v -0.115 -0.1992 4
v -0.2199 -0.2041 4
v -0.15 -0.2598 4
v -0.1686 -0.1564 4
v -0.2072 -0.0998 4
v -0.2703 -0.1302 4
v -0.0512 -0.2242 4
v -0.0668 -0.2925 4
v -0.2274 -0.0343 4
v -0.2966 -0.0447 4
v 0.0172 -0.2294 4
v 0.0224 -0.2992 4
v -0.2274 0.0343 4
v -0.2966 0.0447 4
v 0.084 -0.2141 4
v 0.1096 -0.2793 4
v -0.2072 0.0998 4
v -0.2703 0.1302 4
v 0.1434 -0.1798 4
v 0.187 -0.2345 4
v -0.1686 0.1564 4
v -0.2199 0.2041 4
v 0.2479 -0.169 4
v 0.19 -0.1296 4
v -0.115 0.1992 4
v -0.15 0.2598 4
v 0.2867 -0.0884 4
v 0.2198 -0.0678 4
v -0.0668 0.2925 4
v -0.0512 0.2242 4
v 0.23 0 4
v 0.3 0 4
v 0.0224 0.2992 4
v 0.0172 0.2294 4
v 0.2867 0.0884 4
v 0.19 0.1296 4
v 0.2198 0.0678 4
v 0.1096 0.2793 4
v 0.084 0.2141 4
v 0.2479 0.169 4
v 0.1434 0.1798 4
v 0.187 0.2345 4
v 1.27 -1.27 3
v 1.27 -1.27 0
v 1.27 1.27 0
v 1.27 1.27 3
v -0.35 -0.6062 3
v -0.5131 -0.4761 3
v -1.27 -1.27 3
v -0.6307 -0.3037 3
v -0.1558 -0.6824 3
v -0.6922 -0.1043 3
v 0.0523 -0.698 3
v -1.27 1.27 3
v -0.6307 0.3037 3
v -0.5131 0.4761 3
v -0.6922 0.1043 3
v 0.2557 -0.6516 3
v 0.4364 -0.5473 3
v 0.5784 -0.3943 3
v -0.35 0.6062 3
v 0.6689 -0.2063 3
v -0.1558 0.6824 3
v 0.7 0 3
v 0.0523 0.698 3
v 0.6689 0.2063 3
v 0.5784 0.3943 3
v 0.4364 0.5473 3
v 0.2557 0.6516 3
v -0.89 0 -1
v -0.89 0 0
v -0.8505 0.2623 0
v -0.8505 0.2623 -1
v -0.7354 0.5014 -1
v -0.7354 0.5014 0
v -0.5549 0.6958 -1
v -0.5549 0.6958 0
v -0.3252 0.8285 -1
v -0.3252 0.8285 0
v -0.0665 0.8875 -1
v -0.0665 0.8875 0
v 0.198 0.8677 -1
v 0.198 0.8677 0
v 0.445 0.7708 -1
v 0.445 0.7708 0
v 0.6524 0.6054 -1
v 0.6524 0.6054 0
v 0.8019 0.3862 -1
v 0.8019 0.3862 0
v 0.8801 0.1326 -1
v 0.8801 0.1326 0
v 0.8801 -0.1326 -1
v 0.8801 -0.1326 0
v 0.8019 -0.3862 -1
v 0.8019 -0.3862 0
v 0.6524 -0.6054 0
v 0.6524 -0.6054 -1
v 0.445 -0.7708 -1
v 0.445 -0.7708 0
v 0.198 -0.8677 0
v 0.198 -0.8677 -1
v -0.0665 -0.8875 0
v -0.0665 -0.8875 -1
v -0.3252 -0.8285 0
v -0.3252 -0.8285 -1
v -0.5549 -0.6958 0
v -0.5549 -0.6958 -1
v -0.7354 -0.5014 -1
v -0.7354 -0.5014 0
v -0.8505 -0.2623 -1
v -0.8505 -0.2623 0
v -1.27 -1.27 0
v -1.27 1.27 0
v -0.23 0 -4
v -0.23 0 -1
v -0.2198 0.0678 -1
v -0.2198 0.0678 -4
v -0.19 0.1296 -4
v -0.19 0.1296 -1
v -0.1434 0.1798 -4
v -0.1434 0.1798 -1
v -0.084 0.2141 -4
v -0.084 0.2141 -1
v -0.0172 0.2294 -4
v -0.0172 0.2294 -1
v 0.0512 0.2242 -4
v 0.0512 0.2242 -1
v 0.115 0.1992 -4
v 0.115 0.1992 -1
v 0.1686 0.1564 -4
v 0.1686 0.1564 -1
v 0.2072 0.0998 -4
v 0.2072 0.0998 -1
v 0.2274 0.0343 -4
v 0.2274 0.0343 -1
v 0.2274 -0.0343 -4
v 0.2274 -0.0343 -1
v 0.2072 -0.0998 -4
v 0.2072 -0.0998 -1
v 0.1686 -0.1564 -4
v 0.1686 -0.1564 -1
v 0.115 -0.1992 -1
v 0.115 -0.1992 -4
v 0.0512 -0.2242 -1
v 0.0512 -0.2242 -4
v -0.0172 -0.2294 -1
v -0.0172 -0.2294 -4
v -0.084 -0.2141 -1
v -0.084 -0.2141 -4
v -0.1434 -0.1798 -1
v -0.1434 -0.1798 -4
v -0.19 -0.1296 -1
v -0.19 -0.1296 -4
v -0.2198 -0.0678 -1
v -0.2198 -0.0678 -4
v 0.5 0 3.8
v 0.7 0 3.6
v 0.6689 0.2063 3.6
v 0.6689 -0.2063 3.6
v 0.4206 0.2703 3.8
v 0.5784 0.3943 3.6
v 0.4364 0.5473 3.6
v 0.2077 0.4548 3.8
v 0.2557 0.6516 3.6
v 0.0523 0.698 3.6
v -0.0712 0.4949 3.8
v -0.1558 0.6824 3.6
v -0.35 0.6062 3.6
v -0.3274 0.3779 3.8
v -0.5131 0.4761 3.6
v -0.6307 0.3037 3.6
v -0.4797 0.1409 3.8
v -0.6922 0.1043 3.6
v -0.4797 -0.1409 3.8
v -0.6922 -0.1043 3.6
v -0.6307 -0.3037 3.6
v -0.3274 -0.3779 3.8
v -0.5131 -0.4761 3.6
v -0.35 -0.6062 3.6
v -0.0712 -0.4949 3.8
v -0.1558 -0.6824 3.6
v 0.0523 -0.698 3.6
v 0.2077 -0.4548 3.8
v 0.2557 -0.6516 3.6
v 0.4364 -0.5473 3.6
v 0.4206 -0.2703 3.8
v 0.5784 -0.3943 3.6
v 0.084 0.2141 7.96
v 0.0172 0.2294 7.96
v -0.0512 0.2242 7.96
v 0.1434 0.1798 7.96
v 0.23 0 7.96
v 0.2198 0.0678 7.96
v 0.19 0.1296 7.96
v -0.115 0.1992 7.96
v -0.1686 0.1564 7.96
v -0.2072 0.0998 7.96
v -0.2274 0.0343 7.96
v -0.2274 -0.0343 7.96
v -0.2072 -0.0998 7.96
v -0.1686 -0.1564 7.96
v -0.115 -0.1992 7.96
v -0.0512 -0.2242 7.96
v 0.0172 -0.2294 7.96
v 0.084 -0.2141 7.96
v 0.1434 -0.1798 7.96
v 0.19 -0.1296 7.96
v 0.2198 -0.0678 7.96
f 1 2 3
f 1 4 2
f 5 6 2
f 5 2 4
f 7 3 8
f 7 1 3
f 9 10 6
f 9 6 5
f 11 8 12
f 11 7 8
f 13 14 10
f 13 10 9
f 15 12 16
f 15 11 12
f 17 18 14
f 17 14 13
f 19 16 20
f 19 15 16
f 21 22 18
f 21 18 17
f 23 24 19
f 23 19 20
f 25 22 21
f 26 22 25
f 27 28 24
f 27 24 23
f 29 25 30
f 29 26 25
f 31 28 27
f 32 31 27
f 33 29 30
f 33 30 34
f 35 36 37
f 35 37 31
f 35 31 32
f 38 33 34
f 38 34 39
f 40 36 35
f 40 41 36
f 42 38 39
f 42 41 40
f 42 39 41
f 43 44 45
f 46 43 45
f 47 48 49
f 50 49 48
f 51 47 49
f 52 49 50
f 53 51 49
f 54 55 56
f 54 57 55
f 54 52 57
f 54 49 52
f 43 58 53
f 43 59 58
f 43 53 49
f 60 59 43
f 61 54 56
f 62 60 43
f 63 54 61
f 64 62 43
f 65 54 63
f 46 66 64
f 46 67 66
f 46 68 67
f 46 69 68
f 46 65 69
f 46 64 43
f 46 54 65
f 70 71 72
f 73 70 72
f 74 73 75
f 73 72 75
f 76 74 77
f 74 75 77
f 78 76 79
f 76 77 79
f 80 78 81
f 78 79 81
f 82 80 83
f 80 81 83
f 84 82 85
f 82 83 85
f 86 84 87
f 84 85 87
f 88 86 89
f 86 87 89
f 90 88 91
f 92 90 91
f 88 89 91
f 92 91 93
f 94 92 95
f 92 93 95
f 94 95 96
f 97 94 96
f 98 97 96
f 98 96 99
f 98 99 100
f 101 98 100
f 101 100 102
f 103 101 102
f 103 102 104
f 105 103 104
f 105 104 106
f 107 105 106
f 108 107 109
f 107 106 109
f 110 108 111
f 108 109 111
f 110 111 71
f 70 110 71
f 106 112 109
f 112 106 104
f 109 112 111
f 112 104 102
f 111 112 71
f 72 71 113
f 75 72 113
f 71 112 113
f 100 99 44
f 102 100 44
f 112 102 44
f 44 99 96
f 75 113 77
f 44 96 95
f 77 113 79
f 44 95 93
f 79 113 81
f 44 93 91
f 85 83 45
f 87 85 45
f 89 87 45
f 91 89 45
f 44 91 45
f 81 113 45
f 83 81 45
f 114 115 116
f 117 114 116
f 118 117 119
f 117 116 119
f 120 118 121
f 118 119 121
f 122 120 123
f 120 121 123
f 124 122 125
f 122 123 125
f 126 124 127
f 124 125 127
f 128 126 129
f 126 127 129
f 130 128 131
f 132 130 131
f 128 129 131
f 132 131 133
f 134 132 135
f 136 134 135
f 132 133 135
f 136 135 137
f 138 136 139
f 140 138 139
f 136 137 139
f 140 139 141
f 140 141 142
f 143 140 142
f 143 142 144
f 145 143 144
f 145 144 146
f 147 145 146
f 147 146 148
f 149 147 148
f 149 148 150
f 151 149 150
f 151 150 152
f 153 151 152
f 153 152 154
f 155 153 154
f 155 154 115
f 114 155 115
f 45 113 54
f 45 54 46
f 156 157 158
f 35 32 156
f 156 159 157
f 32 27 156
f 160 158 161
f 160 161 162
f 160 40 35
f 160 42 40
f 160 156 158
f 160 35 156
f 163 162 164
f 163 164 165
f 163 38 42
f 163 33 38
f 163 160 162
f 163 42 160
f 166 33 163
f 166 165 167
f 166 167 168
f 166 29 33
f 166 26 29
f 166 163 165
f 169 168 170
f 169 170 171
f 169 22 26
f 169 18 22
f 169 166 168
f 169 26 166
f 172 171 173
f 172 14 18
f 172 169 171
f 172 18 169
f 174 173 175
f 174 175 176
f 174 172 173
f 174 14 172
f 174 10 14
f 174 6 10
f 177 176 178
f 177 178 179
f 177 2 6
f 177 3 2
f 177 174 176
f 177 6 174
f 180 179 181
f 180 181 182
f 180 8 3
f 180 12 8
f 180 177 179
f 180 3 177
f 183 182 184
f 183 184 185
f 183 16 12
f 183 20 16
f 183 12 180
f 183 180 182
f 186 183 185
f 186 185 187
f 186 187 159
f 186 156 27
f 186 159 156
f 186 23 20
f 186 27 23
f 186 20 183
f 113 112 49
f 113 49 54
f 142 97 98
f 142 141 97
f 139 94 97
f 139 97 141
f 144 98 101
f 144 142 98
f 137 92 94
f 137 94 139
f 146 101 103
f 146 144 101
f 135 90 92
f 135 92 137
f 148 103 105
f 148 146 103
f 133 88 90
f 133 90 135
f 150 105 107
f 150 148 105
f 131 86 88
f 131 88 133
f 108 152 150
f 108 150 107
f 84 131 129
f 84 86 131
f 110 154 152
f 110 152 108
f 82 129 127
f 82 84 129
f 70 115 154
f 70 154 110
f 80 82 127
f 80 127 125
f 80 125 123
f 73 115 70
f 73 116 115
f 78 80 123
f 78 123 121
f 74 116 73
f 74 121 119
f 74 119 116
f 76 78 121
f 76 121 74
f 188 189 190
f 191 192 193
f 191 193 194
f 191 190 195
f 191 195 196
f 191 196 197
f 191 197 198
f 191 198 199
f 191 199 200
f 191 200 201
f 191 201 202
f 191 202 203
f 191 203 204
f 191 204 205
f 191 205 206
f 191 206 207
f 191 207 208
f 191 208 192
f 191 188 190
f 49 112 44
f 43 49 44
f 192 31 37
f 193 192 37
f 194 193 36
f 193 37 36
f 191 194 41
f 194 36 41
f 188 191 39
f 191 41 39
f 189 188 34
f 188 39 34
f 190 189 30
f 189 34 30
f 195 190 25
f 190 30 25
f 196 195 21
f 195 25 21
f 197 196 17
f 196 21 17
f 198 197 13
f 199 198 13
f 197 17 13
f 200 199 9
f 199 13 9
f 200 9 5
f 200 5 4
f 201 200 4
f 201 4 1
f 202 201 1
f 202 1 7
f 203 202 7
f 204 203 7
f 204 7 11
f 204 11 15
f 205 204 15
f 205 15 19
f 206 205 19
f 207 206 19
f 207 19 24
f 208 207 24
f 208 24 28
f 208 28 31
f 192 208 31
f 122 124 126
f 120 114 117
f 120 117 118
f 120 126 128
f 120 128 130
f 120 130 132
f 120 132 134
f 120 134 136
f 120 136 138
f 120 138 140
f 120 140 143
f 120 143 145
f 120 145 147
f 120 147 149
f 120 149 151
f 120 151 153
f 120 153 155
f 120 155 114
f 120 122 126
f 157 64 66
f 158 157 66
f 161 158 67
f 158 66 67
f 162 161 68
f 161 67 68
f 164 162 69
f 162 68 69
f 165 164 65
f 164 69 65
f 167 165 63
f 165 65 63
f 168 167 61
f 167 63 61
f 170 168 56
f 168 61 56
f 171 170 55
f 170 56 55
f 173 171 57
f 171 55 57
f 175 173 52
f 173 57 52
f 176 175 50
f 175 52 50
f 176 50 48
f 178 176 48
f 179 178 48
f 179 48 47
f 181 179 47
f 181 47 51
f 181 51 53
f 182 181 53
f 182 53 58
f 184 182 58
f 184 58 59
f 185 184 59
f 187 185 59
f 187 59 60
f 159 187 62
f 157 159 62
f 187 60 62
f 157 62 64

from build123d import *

# Parameters (mm, degrees)
SKETCH1_W           = 2.54
SKETCH1_H           = 2.54
BOSS_EXTRUDE1_DEPTH = 3
SKETCH2_R           = 0.23
BOSS_EXTRUDE2_DEPTH = 4
SKETCH3_R           = 0.89
BOSS_EXTRUDE3_DEPTH = 1
SKETCH4_R           = 0.23
BOSS_EXTRUDE4_DEPTH = 4.96
SKETCH5_R           = 0.7
BOSS_EXTRUDE5_DEPTH = 1
CHAMFER1_SIZE       = 0.4


with BuildPart() as part:
    # Sketch1 → Boss-Extrude1 (new body)
    with BuildSketch(Plane.XY):
        Rectangle(SKETCH1_W, SKETCH1_H)
    extrude(amount=BOSS_EXTRUDE1_DEPTH)

    # Sketch2 → Boss-Extrude2 (add)
    with BuildSketch(Plane(origin=(0, 0, 0), x_dir=(-1, 0, 0), z_dir=(0, 0, -1))):
        Circle(SKETCH2_R)
    extrude(amount=BOSS_EXTRUDE2_DEPTH)

    # Sketch3 → Boss-Extrude3 (add)
    with BuildSketch(Plane(origin=(0, 0, 0), x_dir=(-1, 0, 0), z_dir=(0, 0, -1))):
        Circle(SKETCH3_R)
    extrude(amount=BOSS_EXTRUDE3_DEPTH)

    # Sketch4 → Boss-Extrude4 (add)
    with BuildSketch(Plane.XY.offset(3)):
        Circle(SKETCH4_R)
    extrude(amount=BOSS_EXTRUDE4_DEPTH)

    # Sketch5 → Boss-Extrude5 (add)
    with BuildSketch(Plane.XY.offset(3)):
        Circle(SKETCH5_R)
    extrude(amount=BOSS_EXTRUDE5_DEPTH)

    # Chamfer1
    chamfer1_edges = [part.edges().sort_by_distance(p)[0] for p in [
        (-0.7, 0, 4),
    ]]
    chamfer(chamfer1_edges, length=CHAMFER1_SIZE)


solid = part.part
